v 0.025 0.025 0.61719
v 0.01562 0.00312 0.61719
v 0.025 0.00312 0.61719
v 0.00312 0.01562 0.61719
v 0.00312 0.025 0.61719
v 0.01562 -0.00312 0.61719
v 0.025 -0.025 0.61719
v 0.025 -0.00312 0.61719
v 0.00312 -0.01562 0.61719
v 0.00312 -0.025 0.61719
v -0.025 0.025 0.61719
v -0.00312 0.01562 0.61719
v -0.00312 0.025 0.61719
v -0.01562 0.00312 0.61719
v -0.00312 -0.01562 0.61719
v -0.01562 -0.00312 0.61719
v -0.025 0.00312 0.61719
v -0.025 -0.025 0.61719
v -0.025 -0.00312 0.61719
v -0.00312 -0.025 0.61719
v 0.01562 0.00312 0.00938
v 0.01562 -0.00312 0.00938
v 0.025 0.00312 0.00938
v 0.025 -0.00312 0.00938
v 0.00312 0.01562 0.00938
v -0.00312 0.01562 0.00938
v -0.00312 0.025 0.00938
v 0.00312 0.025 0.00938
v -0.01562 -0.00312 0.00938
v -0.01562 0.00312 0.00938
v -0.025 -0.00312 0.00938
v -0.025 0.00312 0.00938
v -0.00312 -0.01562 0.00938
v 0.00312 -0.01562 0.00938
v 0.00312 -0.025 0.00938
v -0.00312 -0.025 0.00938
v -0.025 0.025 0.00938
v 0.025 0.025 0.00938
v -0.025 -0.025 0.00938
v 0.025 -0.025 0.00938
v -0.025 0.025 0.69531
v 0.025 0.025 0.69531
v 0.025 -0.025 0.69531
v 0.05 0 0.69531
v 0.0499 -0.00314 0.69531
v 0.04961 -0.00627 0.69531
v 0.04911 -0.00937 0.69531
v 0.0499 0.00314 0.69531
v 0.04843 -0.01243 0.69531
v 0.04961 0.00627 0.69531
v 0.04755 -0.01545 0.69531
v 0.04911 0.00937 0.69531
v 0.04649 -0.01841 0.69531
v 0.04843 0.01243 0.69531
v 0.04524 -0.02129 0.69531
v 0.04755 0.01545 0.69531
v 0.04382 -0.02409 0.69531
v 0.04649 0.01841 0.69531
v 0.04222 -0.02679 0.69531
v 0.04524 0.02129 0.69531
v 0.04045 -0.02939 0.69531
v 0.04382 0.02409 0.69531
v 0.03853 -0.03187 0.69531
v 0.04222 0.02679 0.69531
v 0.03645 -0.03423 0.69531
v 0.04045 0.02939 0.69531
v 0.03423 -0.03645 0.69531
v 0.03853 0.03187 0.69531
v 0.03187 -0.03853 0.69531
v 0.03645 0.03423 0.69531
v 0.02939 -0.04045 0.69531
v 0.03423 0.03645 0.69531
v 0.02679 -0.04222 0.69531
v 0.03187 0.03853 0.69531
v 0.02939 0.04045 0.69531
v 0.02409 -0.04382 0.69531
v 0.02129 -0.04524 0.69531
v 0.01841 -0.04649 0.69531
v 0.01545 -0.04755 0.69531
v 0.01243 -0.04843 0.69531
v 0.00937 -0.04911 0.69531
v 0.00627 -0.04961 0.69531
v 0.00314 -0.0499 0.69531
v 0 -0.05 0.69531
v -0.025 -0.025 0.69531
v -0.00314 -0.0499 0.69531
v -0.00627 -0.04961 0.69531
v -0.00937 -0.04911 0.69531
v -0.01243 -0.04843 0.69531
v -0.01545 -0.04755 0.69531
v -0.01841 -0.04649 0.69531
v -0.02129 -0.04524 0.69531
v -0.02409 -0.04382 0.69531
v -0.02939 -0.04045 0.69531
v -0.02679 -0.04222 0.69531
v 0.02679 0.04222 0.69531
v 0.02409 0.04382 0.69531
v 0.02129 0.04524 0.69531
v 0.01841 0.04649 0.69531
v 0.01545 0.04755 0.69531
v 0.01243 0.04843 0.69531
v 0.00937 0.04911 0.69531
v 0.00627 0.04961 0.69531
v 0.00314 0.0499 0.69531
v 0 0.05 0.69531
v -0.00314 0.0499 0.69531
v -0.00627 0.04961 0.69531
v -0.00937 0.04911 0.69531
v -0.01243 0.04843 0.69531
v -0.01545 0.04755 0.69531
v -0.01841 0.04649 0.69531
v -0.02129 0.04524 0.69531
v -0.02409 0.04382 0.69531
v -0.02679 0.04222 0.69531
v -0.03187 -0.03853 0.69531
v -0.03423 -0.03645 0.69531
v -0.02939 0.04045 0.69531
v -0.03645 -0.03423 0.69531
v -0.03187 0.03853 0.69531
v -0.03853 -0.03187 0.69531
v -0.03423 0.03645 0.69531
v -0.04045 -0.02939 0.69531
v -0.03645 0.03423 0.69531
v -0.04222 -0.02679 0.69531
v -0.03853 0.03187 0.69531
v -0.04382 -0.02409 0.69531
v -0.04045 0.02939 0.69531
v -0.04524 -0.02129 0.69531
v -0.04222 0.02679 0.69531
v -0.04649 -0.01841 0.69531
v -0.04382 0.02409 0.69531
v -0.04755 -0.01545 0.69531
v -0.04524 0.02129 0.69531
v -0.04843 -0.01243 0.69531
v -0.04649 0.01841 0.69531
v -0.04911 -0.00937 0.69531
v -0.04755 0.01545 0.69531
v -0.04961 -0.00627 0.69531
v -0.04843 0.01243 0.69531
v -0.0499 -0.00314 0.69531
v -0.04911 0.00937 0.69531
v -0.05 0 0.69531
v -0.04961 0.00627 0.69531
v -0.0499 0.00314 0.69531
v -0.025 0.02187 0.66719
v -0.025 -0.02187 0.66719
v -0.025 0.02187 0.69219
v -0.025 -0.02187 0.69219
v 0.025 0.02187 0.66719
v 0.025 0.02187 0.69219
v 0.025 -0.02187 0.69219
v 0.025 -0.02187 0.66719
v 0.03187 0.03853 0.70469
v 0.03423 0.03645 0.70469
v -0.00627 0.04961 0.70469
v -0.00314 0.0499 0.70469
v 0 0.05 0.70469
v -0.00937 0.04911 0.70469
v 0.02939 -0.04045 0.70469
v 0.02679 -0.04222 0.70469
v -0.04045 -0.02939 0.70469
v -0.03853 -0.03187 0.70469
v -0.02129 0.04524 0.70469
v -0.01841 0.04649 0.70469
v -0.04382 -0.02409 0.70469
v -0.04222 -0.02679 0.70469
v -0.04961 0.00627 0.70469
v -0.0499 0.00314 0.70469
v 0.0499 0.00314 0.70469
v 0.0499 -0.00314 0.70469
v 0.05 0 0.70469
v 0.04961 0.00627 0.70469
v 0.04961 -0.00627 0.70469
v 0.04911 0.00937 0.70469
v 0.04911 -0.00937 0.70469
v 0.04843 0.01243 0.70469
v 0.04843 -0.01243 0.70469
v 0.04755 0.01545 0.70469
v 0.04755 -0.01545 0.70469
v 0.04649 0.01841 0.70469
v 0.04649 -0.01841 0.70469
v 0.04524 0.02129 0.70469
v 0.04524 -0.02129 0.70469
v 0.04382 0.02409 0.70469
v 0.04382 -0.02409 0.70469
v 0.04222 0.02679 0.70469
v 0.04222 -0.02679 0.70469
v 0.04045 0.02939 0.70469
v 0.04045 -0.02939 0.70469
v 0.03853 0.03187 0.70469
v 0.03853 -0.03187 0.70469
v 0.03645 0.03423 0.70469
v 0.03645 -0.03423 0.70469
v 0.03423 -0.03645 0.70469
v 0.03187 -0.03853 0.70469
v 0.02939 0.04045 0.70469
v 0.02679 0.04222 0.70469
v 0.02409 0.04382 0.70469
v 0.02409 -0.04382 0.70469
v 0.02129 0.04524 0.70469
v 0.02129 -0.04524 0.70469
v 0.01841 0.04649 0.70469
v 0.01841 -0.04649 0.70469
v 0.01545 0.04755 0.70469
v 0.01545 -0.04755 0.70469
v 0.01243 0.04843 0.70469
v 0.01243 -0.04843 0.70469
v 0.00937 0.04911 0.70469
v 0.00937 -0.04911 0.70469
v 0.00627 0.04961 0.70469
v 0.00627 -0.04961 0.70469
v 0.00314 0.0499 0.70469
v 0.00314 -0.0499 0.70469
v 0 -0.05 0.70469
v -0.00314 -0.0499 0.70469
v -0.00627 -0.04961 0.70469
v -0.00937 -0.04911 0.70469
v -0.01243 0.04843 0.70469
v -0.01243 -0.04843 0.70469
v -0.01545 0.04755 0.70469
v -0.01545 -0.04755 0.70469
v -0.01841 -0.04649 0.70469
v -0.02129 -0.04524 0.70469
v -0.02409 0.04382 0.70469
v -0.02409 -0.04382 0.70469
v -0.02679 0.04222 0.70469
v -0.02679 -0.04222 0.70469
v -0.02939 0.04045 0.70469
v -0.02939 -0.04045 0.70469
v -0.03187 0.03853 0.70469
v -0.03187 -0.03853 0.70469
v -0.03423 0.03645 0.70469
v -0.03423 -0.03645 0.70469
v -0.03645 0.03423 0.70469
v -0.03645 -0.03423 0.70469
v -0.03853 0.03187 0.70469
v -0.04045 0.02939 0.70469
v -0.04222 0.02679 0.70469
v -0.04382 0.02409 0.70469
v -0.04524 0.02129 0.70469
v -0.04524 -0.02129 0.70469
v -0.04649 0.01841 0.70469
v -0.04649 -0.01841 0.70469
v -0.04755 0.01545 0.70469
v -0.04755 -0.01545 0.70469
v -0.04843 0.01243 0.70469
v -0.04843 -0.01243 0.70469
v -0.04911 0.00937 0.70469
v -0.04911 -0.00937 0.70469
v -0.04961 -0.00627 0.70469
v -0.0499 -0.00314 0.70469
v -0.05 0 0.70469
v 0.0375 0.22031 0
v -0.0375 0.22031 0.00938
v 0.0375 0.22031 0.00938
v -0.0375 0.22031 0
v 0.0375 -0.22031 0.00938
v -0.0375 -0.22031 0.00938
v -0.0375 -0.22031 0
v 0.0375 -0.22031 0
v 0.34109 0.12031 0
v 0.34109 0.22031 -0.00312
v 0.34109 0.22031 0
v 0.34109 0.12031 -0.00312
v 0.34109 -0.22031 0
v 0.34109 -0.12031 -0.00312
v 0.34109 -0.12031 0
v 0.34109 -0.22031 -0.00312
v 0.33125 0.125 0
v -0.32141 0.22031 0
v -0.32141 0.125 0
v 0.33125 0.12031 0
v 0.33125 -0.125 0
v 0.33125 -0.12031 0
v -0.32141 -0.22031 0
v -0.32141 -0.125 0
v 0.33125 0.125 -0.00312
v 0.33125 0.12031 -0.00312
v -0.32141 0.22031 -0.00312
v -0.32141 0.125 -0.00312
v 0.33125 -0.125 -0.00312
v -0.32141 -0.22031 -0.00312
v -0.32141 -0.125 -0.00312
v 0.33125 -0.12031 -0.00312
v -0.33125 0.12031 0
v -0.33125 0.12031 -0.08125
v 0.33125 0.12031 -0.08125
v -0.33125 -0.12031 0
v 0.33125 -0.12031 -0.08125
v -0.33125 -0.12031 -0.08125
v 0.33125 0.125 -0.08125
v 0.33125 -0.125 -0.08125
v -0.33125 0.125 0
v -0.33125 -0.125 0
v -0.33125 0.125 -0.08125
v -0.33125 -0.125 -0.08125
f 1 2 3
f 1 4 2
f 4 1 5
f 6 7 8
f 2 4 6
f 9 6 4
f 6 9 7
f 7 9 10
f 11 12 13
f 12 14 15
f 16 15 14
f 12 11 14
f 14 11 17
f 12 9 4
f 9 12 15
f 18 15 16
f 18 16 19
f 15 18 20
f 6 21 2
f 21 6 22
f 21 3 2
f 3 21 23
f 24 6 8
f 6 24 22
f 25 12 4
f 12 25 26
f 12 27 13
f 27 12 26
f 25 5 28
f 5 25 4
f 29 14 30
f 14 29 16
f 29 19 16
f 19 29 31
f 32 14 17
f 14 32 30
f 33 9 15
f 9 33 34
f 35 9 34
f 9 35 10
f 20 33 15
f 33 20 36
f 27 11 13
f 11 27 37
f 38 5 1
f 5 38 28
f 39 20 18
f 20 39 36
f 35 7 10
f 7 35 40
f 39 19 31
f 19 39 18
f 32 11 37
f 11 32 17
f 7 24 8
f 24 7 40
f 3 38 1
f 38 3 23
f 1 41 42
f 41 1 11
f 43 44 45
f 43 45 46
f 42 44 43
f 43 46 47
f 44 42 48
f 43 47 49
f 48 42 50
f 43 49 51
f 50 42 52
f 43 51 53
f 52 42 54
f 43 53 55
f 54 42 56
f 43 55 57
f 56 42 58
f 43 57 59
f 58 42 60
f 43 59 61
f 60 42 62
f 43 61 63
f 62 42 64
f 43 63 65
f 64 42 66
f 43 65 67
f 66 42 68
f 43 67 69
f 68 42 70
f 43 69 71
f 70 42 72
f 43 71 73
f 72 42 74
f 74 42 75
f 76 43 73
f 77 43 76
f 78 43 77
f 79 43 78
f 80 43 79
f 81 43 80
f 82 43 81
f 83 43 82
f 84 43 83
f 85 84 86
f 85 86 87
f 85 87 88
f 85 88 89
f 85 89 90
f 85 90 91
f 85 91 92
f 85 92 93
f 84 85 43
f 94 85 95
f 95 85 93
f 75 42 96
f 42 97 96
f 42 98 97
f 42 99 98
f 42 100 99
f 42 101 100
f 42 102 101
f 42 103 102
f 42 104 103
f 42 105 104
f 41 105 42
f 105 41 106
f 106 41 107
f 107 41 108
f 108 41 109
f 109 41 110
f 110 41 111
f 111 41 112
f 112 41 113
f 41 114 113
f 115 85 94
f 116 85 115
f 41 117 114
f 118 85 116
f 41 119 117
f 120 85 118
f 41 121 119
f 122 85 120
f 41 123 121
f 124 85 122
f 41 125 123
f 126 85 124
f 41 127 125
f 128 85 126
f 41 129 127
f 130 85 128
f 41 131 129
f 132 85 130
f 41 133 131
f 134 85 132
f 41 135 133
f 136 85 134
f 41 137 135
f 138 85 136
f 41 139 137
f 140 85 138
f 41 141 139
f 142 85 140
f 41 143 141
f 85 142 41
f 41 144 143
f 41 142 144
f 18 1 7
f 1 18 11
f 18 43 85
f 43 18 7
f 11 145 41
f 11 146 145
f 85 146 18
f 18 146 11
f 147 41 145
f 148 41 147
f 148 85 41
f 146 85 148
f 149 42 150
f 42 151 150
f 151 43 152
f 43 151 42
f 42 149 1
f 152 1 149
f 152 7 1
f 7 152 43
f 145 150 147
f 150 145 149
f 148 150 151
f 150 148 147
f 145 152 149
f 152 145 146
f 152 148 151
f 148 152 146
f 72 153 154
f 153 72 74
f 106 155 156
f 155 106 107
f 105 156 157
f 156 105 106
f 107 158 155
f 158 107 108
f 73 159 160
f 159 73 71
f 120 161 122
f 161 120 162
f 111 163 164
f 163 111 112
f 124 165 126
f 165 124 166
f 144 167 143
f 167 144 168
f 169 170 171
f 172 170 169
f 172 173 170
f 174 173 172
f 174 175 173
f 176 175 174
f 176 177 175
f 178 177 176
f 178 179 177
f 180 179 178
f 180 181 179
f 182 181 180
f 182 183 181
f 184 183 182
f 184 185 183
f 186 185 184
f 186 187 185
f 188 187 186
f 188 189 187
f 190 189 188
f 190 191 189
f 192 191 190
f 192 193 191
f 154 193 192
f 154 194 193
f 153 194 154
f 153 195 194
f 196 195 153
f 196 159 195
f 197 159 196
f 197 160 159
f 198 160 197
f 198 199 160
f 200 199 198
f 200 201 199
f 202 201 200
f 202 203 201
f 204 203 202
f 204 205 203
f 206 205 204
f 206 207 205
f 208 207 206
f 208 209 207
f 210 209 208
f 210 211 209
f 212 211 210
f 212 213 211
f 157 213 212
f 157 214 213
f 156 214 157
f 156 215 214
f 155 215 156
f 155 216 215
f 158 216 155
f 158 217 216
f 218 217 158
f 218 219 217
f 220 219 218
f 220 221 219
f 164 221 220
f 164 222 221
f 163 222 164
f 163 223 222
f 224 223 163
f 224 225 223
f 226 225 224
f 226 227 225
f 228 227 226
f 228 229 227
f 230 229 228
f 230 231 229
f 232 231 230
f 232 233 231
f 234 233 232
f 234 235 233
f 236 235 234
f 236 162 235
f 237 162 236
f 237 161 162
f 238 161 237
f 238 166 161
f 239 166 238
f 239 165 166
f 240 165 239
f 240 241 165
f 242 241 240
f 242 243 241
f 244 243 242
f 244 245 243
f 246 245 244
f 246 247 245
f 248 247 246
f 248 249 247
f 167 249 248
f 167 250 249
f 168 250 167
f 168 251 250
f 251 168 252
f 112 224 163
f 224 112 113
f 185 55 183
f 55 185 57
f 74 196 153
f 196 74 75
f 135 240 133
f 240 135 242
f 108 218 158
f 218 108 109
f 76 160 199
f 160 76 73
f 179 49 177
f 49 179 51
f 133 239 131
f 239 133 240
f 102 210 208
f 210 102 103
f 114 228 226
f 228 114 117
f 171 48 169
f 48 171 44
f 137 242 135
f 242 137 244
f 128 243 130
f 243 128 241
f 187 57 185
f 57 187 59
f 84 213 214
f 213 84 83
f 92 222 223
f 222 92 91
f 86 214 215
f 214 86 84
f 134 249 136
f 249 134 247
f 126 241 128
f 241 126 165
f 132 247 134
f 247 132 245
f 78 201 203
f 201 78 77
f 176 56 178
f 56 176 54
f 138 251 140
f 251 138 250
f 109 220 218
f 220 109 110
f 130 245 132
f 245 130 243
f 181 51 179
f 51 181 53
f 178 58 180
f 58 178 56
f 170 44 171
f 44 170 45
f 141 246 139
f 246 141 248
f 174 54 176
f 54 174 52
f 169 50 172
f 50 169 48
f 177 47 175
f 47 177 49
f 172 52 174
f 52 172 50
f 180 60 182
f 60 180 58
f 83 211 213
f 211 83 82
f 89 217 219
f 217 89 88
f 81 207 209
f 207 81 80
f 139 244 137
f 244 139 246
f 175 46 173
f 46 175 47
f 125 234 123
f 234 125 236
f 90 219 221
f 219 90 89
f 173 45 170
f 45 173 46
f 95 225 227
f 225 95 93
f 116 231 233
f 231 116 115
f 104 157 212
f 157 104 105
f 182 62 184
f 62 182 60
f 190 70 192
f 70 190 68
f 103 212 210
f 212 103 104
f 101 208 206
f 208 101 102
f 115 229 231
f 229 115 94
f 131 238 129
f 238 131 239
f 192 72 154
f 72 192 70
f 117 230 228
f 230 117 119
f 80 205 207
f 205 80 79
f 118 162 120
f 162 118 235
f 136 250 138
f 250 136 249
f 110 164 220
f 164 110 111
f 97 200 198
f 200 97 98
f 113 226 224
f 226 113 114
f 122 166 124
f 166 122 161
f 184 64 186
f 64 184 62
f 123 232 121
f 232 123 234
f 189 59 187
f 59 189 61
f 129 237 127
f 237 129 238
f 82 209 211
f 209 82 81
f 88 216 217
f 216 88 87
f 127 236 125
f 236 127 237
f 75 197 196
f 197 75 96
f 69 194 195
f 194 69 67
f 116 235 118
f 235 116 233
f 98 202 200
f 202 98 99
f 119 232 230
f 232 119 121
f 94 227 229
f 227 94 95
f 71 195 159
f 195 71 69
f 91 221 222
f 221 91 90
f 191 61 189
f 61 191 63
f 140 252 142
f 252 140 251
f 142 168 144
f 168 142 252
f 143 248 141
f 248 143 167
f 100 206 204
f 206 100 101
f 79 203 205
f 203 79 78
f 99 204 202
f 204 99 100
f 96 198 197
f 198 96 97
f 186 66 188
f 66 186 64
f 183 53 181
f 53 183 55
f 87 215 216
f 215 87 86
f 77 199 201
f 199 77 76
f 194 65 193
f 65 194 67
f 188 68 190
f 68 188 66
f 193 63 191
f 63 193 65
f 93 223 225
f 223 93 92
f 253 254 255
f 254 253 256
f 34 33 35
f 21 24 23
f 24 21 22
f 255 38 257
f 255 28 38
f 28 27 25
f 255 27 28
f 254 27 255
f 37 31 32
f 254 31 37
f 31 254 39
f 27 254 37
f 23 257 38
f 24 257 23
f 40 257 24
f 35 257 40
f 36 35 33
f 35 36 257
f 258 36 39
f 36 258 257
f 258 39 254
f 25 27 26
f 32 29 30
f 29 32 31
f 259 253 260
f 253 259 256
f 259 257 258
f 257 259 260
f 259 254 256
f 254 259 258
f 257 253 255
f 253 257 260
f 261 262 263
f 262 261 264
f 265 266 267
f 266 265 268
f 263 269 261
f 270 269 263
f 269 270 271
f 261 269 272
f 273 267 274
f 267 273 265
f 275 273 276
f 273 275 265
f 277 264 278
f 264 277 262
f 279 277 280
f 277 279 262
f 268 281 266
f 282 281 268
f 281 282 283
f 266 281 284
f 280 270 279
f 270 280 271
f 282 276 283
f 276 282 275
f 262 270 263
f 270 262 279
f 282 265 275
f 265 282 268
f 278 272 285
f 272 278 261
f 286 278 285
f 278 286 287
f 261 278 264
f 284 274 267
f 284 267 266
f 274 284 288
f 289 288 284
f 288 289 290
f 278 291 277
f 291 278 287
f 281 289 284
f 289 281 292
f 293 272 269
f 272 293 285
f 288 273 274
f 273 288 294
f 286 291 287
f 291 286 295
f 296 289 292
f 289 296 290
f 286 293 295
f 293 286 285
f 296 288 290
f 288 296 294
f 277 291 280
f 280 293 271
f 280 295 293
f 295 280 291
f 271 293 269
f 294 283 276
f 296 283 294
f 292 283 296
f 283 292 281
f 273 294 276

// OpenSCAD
module cube_base(width, length, height)
{
    cube(size = [width, length, height], center = true);
}

module cylinder_base(radius, height, roundness)
{
    cylinder(r = radius, h = height, $fn = roundness, center = true);
}

module cone_base(radius1, radius2, height, roundness)
{
    cylinder(r1 = radius1, r2 = radius2, h = height, $fn = roundness, center = true);
}

module sphere_base(radius, roundness)
{
    sphere(r = radius, $fn = roundness, center = true);
}
/****************************************************************/
in_to_mm      = 25.4;
roundness     = 100;

module nav_tower()
{
    //bottom plate
    bottom_plate_x = (17 + 5/8) * in_to_mm;
    bottom_plate_y = 3 * in_to_mm;
    bottom_plate_z = (3/8) * in_to_mm;

    //tower
    tower_x = 2 * in_to_mm;
    tower_y = 2 * in_to_mm;
    tower_z = 24.5 * in_to_mm;
    slot_x  = 0.5 * in_to_mm;
    slot_y  = 0.25 * in_to_mm;
    slot_z  = tower_z;

    //cap cube
    cap_cube_x = 2 * in_to_mm;
    cap_cube_y = 2 * in_to_mm;
    cap_cube_z = (3 + 1/8) * in_to_mm;

    //imu gap
    imu_gap_x = 1.75 * in_to_mm;
    imu_gap_y = 2.1 * in_to_mm;
    imu_gap_z = 1 * in_to_mm;

    //cap disk
    cap_disk_r = 2 * in_to_mm;
    cap_disk_z = (3/8) * in_to_mm;

    translate([0, 0, bottom_plate_z * 0.5])
    {
        cube_base(bottom_plate_x, bottom_plate_y, bottom_plate_z);
        translate([0, 0, tower_z * 0.5])
        {
            difference()
            {
                cube_base(tower_x, tower_y, tower_z);
                for(rz = [-1:2])
                {
                    rotate([0, 0, 90 * rz])
                    translate([(tower_y - slot_y) * 0.5, 0 ,0])
                    cube_base(slot_x, slot_y, slot_z);
                }
            }
            translate([0, 0, tower_z * 0.5 + cap_cube_z * 0.5])
            {
                difference()
                {
                    cube_base(cap_cube_x, cap_cube_y, cap_cube_z);
                    translate([0, 0, - cap_cube_z * 0.5 + imu_gap_z * 0.5 + 2 * in_to_mm])
                    cube_base(imu_gap_x, imu_gap_y, imu_gap_z);
                }
                translate([0, 0, cap_cube_z * 0.5 + cap_disk_z * 0.5])
                cylinder_base(cap_disk_r, cap_disk_z, roundness);
            }
        }
    }
}

module tread_guards()
{
    translate([-26.5 * in_to_mm * 0.5 * 0.001968504/2, -4.625 * in_to_mm * 0.001968504/2, 0])
    import("/home/user1/rad_ws/src/gvrbot_description/meshes/IGVC_8020Frame.stl");
}

rotate([0, 0, 90])
scale([0.001968504/2, 0.001968504/2, 0.001968504/2])
nav_tower();
//tread_guards();
scale([0.001968504/2, 0.001968504/2, 0.001968504/2])
{
    translate([10, 0, -0.125 * 0.5 * in_to_mm])
    difference()
    {
        cube_base(26.5 * in_to_mm, 17.625 * in_to_mm, 0.125 * in_to_mm);
        cube_base(26.5 * in_to_mm, (9.625) * in_to_mm, 0.125 * in_to_mm);
    }

    translate([0, 0, -3.25 * 0.5 * in_to_mm])
    difference()
    {
        cube_base(26.5 * in_to_mm, 10 * in_to_mm, 3.25 * in_to_mm);
        cube_base(26.5 * in_to_mm, (9.625) * in_to_mm, 3.25 * in_to_mm);
    }
}
//difference()
//{
//    tread_guards();
//    scale([0.001968504/2, 0.001968504/2, 0.001968504/2])
//    translate([0, 0, 12 * in_to_mm * 0.5])
//    cube_base(36 * in_to_mm, 17.625 * in_to_mm, 12 * in_to_mm);
//}
